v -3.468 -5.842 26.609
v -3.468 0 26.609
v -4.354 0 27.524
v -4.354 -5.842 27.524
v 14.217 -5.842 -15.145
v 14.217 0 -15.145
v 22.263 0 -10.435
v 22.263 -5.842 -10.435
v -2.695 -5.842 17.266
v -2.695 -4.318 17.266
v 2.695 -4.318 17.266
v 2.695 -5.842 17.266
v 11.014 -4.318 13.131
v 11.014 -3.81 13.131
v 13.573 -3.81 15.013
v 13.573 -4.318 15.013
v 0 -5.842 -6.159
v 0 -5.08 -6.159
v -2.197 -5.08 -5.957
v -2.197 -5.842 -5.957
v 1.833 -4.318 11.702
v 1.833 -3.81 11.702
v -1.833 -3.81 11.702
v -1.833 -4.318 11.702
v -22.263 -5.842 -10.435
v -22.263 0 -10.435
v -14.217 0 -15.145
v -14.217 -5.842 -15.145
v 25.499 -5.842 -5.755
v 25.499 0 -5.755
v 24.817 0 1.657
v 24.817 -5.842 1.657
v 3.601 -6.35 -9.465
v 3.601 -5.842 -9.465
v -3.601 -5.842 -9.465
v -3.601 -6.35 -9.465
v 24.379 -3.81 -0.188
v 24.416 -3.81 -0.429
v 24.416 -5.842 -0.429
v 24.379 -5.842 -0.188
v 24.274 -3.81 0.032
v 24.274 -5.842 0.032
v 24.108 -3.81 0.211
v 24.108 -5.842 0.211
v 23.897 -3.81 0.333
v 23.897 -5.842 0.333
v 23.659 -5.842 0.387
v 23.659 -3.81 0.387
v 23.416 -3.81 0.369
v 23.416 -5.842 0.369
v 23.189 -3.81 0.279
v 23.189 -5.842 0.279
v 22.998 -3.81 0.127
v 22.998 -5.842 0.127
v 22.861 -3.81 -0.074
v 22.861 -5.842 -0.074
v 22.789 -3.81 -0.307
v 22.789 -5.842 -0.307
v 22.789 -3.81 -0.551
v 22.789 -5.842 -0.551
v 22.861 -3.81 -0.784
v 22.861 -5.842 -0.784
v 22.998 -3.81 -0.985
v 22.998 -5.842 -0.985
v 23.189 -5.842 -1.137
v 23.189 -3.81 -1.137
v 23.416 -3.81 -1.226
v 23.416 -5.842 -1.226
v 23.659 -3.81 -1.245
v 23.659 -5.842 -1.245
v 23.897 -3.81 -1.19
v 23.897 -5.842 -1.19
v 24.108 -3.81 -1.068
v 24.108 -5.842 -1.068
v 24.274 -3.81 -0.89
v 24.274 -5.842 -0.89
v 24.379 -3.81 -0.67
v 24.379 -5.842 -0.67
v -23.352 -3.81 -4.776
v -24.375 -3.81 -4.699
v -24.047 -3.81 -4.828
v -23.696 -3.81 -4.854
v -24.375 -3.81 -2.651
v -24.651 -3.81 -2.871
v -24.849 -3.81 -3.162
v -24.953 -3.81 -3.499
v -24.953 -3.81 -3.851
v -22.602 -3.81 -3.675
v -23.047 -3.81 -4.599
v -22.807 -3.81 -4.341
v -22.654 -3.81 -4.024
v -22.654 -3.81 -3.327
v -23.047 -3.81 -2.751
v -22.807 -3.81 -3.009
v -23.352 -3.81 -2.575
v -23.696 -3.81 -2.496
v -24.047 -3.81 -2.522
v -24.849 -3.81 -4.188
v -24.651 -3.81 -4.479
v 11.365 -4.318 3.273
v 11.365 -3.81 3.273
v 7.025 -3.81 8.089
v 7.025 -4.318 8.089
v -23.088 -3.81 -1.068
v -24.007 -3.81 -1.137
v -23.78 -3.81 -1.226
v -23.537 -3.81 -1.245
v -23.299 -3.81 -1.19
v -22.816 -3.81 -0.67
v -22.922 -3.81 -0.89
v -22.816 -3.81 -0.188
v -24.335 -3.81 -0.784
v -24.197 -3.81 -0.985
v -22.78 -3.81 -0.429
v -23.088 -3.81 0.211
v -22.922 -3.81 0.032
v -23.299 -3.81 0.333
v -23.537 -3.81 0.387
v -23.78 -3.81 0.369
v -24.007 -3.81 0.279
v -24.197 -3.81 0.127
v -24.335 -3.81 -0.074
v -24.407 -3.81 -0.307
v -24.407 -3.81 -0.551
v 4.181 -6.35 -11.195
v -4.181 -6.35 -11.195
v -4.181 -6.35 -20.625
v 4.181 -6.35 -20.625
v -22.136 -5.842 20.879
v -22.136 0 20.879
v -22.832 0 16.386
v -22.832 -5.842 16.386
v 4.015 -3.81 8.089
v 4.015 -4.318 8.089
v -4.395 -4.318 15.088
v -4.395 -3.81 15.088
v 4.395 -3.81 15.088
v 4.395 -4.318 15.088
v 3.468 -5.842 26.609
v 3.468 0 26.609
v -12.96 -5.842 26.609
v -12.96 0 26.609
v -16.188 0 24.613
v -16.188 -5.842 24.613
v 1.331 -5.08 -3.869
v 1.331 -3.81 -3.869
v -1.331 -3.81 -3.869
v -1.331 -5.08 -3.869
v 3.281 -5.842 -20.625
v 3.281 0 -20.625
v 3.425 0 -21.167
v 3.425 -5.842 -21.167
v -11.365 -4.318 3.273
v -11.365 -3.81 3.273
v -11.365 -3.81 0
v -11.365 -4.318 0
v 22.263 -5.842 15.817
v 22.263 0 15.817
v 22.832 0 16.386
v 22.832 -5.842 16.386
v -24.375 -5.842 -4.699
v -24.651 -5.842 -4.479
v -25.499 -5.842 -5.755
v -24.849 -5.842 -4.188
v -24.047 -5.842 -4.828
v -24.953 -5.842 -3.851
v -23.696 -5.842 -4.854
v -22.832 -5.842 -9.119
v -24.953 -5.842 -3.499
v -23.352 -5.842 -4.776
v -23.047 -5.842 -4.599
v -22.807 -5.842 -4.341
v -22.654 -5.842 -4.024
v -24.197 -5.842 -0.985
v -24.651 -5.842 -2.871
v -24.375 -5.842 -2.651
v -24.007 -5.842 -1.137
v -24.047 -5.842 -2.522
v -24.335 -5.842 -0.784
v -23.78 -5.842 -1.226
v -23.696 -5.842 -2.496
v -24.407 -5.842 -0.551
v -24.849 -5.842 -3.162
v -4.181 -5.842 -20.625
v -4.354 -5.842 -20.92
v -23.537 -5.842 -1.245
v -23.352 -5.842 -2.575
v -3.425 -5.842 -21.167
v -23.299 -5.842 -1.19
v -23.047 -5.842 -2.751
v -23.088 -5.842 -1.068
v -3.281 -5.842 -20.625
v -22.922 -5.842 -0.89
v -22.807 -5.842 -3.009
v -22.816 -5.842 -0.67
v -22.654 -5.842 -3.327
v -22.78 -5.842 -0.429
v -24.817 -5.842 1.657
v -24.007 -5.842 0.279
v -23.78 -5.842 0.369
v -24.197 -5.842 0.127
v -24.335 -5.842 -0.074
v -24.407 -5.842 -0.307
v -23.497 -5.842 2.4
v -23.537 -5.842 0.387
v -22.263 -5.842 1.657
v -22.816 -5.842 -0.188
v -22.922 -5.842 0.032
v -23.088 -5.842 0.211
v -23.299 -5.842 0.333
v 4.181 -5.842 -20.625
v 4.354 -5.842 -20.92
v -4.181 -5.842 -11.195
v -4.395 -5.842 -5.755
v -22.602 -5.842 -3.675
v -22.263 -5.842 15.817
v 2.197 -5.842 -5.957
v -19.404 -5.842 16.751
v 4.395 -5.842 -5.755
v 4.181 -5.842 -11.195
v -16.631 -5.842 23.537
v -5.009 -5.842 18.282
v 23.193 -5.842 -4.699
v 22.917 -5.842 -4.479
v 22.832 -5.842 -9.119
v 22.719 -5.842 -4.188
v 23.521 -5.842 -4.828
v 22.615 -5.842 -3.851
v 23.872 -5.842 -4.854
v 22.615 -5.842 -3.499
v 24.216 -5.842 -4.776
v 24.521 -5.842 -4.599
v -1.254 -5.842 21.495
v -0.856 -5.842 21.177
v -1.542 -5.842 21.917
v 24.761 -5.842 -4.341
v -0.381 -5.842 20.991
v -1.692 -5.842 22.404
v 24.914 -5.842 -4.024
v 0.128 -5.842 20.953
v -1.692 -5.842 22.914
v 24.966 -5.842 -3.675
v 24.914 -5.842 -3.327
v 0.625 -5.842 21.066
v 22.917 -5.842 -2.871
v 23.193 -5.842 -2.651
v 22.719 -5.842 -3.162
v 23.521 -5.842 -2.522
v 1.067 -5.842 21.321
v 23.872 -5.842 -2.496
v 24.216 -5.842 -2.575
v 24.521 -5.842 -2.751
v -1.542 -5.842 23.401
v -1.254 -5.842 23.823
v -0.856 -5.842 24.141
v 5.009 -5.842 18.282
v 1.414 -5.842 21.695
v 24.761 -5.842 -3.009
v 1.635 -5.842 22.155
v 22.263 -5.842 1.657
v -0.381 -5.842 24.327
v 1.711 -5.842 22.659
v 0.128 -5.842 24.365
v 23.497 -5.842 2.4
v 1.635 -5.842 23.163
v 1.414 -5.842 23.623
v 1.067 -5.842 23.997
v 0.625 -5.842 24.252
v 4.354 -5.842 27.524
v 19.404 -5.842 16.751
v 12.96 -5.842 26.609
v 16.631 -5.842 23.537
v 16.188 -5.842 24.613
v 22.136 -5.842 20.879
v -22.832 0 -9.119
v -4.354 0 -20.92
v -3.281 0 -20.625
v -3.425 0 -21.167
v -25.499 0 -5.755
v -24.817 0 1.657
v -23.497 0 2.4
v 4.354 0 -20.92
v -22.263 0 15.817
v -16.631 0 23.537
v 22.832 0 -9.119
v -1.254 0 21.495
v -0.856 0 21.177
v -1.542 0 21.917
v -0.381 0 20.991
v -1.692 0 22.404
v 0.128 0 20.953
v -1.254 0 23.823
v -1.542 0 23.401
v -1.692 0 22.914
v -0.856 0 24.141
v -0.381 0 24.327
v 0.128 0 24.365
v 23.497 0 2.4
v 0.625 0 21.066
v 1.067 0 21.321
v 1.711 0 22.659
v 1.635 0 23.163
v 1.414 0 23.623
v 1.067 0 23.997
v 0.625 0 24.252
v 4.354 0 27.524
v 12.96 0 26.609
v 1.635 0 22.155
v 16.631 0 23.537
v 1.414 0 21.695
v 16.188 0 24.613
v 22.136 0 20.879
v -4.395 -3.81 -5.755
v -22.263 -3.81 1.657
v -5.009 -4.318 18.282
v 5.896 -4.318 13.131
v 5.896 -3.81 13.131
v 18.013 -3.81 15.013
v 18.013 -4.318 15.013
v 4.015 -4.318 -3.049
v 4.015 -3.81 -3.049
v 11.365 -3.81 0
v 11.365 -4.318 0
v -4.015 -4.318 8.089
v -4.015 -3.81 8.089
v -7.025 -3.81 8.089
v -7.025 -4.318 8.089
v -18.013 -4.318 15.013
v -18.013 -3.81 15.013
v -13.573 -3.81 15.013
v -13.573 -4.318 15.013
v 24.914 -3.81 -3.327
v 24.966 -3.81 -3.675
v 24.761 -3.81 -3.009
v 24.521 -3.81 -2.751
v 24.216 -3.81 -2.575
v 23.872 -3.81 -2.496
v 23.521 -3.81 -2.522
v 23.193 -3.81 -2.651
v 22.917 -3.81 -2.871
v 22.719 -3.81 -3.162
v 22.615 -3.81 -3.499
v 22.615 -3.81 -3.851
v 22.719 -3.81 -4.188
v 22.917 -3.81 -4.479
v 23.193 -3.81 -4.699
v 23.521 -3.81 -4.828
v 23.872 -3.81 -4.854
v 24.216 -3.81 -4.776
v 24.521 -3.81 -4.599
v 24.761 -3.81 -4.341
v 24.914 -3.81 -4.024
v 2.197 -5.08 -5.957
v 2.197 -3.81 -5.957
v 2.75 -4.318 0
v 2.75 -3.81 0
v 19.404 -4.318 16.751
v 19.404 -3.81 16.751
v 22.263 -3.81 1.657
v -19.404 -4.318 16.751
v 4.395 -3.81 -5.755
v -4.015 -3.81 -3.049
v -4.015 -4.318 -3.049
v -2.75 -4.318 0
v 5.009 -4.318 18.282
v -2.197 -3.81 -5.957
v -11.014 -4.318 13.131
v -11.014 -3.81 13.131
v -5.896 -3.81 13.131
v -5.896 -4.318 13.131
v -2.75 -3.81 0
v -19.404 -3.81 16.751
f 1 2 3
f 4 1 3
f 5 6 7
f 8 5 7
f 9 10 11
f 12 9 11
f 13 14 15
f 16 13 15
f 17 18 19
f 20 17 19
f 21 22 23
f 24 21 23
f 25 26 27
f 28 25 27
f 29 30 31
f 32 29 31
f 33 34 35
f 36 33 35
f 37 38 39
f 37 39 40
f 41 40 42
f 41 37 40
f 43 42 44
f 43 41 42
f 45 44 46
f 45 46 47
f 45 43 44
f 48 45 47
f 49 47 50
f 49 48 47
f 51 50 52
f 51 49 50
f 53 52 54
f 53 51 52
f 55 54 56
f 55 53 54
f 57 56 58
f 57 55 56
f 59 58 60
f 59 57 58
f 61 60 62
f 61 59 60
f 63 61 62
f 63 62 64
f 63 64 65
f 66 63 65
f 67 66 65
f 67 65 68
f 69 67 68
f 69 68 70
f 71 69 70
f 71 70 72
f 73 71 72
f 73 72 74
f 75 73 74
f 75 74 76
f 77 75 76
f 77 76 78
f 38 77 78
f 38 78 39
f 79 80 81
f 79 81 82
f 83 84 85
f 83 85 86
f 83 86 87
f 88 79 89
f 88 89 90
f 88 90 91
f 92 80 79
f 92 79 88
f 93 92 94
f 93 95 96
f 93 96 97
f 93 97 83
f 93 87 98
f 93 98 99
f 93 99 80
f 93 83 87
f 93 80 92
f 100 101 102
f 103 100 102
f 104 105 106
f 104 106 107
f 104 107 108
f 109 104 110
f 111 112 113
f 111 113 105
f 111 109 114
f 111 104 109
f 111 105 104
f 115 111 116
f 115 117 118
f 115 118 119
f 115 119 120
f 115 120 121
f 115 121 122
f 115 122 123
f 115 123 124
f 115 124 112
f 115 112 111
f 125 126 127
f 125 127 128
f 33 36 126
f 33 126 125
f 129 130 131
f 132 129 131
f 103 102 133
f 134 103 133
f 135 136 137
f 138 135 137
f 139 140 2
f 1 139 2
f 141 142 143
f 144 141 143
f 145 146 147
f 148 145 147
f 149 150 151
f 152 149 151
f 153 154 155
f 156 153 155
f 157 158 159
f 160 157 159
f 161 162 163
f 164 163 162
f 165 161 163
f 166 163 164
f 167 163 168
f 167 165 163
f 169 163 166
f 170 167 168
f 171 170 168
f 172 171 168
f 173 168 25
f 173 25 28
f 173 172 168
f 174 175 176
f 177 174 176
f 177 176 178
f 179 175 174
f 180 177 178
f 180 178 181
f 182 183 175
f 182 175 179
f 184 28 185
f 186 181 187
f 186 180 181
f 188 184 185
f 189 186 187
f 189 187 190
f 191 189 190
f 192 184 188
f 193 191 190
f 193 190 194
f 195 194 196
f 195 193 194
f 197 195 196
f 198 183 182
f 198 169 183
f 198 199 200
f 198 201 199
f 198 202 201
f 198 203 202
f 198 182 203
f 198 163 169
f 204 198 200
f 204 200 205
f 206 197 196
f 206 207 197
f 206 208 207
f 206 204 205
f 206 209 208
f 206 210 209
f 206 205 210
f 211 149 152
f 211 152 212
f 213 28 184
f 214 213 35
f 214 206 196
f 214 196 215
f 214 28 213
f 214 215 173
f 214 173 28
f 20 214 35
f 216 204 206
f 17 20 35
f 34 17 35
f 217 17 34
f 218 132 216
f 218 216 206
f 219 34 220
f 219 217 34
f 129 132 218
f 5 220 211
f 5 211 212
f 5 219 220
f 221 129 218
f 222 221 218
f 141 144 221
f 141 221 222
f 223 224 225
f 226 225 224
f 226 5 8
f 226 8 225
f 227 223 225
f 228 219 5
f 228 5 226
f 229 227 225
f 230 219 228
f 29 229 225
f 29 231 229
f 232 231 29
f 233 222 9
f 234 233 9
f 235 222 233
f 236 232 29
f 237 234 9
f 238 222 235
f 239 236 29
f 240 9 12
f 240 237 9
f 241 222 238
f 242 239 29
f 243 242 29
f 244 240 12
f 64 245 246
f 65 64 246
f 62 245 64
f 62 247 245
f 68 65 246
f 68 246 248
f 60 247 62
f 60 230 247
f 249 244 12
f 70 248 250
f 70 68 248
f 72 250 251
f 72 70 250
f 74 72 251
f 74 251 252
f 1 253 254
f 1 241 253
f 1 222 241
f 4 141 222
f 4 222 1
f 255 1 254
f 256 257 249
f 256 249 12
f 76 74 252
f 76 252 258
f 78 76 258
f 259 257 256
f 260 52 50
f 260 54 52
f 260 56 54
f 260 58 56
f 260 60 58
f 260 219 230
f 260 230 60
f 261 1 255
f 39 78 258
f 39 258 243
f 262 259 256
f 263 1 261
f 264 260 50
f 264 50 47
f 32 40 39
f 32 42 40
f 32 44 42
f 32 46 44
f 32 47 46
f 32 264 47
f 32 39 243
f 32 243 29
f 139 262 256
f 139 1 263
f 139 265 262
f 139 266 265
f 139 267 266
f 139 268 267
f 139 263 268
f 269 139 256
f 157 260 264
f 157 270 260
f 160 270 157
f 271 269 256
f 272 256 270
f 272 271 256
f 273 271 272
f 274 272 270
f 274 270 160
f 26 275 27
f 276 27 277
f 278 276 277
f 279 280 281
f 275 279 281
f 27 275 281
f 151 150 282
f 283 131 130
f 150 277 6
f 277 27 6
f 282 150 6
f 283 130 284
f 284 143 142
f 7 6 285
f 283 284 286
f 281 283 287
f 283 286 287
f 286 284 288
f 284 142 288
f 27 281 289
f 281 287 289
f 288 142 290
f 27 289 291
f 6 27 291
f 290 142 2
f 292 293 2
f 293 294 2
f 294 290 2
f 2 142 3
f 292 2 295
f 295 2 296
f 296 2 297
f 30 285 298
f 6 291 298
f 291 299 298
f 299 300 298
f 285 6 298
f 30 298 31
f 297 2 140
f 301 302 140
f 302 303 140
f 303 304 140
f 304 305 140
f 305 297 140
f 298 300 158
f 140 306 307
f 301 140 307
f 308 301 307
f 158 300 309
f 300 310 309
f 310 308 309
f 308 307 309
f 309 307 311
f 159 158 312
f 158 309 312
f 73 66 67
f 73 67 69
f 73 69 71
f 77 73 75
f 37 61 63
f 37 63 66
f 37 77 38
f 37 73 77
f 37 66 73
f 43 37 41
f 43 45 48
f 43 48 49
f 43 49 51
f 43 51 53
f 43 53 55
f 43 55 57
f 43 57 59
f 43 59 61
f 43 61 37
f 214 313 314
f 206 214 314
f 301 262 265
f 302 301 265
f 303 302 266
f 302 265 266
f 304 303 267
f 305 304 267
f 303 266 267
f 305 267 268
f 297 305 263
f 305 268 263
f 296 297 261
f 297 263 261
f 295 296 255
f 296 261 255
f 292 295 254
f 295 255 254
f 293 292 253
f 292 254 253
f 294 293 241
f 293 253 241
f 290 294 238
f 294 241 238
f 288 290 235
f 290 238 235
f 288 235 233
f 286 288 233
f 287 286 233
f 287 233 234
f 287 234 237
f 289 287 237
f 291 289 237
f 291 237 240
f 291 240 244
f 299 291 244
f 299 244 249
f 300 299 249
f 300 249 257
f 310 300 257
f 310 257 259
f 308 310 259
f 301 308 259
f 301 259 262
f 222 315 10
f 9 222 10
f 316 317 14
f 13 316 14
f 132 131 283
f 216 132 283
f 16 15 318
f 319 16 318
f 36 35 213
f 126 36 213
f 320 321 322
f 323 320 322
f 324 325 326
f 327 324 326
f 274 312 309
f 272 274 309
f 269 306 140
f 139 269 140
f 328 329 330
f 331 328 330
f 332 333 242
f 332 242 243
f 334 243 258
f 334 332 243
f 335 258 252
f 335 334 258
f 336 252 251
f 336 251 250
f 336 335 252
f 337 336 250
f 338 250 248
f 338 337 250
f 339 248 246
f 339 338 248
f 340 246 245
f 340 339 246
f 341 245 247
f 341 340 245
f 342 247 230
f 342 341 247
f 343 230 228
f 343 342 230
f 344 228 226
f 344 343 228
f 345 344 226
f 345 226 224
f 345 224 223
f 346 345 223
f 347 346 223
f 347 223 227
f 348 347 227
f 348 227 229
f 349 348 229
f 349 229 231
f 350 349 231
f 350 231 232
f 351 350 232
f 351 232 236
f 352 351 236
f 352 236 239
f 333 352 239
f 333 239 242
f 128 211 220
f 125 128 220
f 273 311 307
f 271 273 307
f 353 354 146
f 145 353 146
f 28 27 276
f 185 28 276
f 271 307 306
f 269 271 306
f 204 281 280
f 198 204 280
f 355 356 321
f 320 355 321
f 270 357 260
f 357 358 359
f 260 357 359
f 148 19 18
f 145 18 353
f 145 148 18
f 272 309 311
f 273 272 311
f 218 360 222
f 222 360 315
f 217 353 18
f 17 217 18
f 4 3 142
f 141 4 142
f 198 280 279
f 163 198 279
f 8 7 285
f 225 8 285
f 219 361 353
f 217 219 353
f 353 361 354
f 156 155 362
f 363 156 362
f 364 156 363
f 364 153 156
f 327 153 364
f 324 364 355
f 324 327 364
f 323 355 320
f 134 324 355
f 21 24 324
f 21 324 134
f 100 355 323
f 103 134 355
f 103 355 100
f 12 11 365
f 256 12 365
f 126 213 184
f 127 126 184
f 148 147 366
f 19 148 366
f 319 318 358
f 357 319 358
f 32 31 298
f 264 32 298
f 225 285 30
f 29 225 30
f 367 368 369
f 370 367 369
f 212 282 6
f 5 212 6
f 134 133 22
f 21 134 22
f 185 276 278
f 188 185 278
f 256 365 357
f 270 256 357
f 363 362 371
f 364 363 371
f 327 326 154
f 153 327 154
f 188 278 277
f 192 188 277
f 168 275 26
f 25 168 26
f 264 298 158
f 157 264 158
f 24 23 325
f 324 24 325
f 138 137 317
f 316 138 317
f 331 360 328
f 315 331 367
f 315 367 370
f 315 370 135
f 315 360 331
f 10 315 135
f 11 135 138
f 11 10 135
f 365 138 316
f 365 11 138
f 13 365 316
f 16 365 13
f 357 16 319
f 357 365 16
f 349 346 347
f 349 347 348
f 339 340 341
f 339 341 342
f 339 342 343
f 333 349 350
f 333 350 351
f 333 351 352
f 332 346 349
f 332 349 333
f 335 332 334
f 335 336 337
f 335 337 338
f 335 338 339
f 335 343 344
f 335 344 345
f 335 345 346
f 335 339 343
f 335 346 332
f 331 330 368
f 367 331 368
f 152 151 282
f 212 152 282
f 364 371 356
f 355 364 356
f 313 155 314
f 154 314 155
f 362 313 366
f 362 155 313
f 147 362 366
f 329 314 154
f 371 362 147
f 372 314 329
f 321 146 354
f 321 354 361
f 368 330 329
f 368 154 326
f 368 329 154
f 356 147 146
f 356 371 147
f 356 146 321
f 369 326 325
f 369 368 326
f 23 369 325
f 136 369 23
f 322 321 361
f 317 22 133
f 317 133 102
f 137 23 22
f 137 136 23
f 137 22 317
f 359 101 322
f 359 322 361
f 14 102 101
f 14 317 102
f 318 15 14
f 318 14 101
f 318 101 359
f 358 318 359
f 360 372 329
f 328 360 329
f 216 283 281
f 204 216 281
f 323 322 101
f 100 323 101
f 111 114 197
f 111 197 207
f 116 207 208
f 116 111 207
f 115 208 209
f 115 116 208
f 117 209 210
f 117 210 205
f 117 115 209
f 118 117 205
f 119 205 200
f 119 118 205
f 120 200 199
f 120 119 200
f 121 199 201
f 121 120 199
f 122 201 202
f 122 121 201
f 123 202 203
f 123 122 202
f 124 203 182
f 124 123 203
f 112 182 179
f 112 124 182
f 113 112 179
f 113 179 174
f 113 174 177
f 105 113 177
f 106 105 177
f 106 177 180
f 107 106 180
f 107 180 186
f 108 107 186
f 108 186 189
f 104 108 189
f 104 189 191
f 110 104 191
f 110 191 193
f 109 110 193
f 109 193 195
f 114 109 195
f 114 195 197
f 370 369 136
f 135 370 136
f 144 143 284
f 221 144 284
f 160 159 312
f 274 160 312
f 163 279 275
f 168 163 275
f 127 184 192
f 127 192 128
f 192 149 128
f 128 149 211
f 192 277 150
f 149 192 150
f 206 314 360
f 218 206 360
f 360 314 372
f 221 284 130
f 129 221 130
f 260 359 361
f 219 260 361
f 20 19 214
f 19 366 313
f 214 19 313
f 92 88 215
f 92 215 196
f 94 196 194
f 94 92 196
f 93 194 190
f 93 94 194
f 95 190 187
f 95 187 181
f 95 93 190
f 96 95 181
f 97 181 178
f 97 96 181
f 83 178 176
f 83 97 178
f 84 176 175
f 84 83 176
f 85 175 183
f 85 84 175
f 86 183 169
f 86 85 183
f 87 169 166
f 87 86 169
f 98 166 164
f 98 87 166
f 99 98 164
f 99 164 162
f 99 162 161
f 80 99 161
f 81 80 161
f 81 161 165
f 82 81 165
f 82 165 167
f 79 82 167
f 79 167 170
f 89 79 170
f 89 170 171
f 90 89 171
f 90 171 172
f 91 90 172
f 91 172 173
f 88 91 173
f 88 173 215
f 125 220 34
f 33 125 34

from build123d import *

# Parameters (mm, degrees)
F0_R     = 1.182239
F0_R_2   = 0.817997
F1_DEPTH = 5.842
F2_DEPTH = 3.81
F3_DEPTH = 5.08
F4_DEPTH = 4.318
F5_R     = 1.71122
F6_DEPTH = 25.4
F7_DEPTH = 6.35


with BuildPart() as f1:
    # F0 (on Front) → F1 (new body)
    with BuildSketch(Plane.XZ):
        Polygon((-4.180855, -20.625193), (-4.353608, -20.920252), (-3.424949, -21.167446), (-3.28061, -20.625193), align=None)
        Polygon((3.424949, -21.167446), (4.353608, -20.920252), (4.180855, -20.625193), (3.28061, -20.625193), align=None)
        Polygon((22.26289, -6.835999), (22.26289, 1.657223), (4.394875, -5.754956), (2.197438, -5.957079), (0, -6.159202), (-2.197438, -5.957079), (-4.394875, -5.754956), (-22.26289, 1.657223), (-22.26289, -6.835999), (-22.832444, -9.118818), (-15.86828, -11.246894), (-14.217053, -15.145346), (-4.353608, -20.920252), (-4.180855, -20.625193), (-4.180855, -11.195441), (-3.601368, -9.465247), (0, -9.465247), (3.601368, -9.465247), (4.180855, -11.195441), (4.180855, -20.625193), (4.353608, -20.920252), (14.217053, -15.145346), (15.86828, -11.246894), (22.832444, -9.118818), align=None)
        Polygon((-15.86828, -11.246894), (-22.832444, -9.118818), (-22.26289, -10.434624), (-14.217053, -15.145346), align=None)
        Polygon((22.26289, -10.434624), (22.832444, -9.118818), (15.86828, -11.246894), (14.217053, -15.145346), align=None)
        Polygon((24.816887, 1.657223), (22.26289, 1.657223), (22.26289, -6.835999), (22.832444, -9.118818), (25.498668, -5.754956), align=None)
        with Locations((23.784082, -3.675047)):
            Circle(F0_R, mode=Mode.SUBTRACT)
        with Locations((23.597831, -0.42893)):
            Circle(F0_R_2, mode=Mode.SUBTRACT)
        Polygon((-22.26289, -6.835999), (-22.26289, 1.657223), (-24.816887, 1.657223), (-25.498668, -5.754956), (-22.832444, -9.118818), align=None)
        with Locations((-23.784082, -3.675047)):
            Circle(F0_R, mode=Mode.SUBTRACT)
        with Locations((-23.597831, -0.42893)):
            Circle(F0_R_2, mode=Mode.SUBTRACT)
        Polygon((-19.404403, 16.750786), (-22.26289, 15.816627), (-23.496922, 2.400486), (-22.26289, 1.657223), align=None)
        Polygon((23.496922, 2.400486), (22.26289, 15.816627), (19.404403, 16.750786), (22.26289, 1.657223), align=None)
        Polygon((24.816887, 1.657223), (23.496922, 2.400486), (22.26289, 1.657223), align=None)
        Polygon((-22.26289, 1.657223), (-23.496922, 2.400486), (-24.816887, 1.657223), align=None)
        Polygon((-19.404403, 16.750786), (-22.832444, 16.386179), (-22.26289, 15.816627), align=None)
        Polygon((22.26289, 15.816627), (22.832444, 16.386179), (19.404403, 16.750786), align=None)
        Polygon((22.832444, 16.386179), (22.136323, 20.879321), (5.009265, 22.700958), (2.695112, 21.684956), (0, 21.684956), (-2.695112, 21.684956), (-5.009265, 22.700958), (-22.136323, 20.879321), (-22.832444, 16.386179), (-19.404403, 16.750786), (-5.009265, 18.281856), (-2.695112, 17.265854), (0, 17.265854), (2.695112, 17.265854), (5.009265, 18.281856), (19.404403, 16.750786), align=None)
        Polygon((3.467637, 26.608711), (0, 26.608711), (-3.467637, 26.608711), (-4.353608, 27.524108), (-12.96019, 26.608711), (-16.187659, 24.61306), (-16.630644, 23.537237), (-22.136323, 20.879321), (-5.009265, 22.700958), (-2.695112, 21.684956), (0, 21.684956), (2.695112, 21.684956), (5.009265, 22.700958), (22.136323, 20.879321), (16.630644, 23.537237), (16.187659, 24.61306), (12.96019, 26.608711), (4.353608, 27.524108), align=None)
    extrude(amount=F1_DEPTH)

    # F0 (on Front) → F2 (join)
    with BuildSketch(Plane.XZ):
        with Locations((23.784082, -3.675047)):
            Circle(F0_R)
        with Locations((23.597831, -0.42893)):
            Circle(F0_R_2)
        with Locations((-23.784082, -3.675047)):
            Circle(F0_R)
        with Locations((-23.597831, -0.42893)):
            Circle(F0_R_2)
        Polygon((22.26289, 1.657223), (19.404403, 16.750786), (18.012892, 15.012917), (13.572707, 15.012917), (11.013955, 13.131482), (5.896451, 13.131482), (4.394875, 15.088174), (0, 15.088174), (-4.394875, 15.088174), (-5.896451, 13.131482), (-11.013955, 13.131482), (-13.572707, 15.012917), (-18.012892, 15.012917), (-19.404403, 16.750786), (-22.26289, 1.657223), (-4.394875, -5.754956), (-2.197438, -5.957079), (-1.331172, -3.868833), (0, -3.868833), (1.331172, -3.868833), (2.197438, -5.957079), (4.394875, -5.754956), align=None)
        Polygon((-2.750259, 0), (-4.015016, -3.048861), (-11.364689, 0), (-11.364689, 3.272761), (-7.025312, 8.089235), (-4.015016, 8.089235), (-1.832551, 11.701591), (0, 11.701591), (1.832551, 11.701591), (4.015016, 8.089235), (7.025312, 8.089235), (11.364689, 3.272761), (11.364689, 0), (4.015016, -3.048861), (2.750259, 0), (0, 0), align=None, mode=Mode.SUBTRACT)
    extrude(amount=F2_DEPTH)

    # F0 (on Front) → F3 (join)
    with BuildSketch(Plane.XZ):
        Polygon((0, -6.159202), (2.197438, -5.957079), (1.331172, -3.868833), (0, -3.868833), (-1.331172, -3.868833), (-2.197438, -5.957079), align=None)
    extrude(amount=F3_DEPTH)

    # F0 (on Front) → F4 (join)
    with BuildSketch(Plane.XZ):
        Polygon((-11.364689, 0), (-4.015016, -3.048861), (-2.750259, 0), (0, 0), (2.750259, 0), (4.015016, -3.048861), (11.364689, 0), (11.364689, 3.272761), (7.025312, 8.089235), (4.015016, 8.089235), (1.832551, 11.701591), (0, 11.701591), (-1.832551, 11.701591), (-4.015016, 8.089235), (-7.025312, 8.089235), (-11.364689, 3.272761), align=None)
        Polygon((18.012892, 15.012917), (19.404403, 16.750786), (5.009265, 18.281856), (2.695112, 17.265854), (0, 17.265854), (-2.695112, 17.265854), (-5.009265, 18.281856), (-19.404403, 16.750786), (-18.012892, 15.012917), (-13.572707, 15.012917), (-11.013955, 13.131482), (-5.896451, 13.131482), (-4.394875, 15.088174), (0, 15.088174), (4.394875, 15.088174), (5.896451, 13.131482), (11.013955, 13.131482), (13.572707, 15.012917), align=None)
    extrude(amount=F4_DEPTH)

    # F5 (on face) → F6 (cut)
    with BuildSketch(Plane.XZ.offset(5.842)):
        with Locations((0, 22.658981)):
            Circle(F5_R)
    extrude(amount=-F6_DEPTH, mode=Mode.SUBTRACT)

    # F0 (on Front) → F7 (join)
    with BuildSketch(Plane.XZ):
        Polygon((3.28061, -20.625193), (4.180855, -20.625193), (4.180855, -11.195441), (3.601368, -9.465247), (0, -9.465247), (-3.601368, -9.465247), (-4.180855, -11.195441), (-4.180855, -20.625193), (-3.28061, -20.625193), (0, -20.625193), align=None)
    extrude(amount=F7_DEPTH)


solid = f1.part
